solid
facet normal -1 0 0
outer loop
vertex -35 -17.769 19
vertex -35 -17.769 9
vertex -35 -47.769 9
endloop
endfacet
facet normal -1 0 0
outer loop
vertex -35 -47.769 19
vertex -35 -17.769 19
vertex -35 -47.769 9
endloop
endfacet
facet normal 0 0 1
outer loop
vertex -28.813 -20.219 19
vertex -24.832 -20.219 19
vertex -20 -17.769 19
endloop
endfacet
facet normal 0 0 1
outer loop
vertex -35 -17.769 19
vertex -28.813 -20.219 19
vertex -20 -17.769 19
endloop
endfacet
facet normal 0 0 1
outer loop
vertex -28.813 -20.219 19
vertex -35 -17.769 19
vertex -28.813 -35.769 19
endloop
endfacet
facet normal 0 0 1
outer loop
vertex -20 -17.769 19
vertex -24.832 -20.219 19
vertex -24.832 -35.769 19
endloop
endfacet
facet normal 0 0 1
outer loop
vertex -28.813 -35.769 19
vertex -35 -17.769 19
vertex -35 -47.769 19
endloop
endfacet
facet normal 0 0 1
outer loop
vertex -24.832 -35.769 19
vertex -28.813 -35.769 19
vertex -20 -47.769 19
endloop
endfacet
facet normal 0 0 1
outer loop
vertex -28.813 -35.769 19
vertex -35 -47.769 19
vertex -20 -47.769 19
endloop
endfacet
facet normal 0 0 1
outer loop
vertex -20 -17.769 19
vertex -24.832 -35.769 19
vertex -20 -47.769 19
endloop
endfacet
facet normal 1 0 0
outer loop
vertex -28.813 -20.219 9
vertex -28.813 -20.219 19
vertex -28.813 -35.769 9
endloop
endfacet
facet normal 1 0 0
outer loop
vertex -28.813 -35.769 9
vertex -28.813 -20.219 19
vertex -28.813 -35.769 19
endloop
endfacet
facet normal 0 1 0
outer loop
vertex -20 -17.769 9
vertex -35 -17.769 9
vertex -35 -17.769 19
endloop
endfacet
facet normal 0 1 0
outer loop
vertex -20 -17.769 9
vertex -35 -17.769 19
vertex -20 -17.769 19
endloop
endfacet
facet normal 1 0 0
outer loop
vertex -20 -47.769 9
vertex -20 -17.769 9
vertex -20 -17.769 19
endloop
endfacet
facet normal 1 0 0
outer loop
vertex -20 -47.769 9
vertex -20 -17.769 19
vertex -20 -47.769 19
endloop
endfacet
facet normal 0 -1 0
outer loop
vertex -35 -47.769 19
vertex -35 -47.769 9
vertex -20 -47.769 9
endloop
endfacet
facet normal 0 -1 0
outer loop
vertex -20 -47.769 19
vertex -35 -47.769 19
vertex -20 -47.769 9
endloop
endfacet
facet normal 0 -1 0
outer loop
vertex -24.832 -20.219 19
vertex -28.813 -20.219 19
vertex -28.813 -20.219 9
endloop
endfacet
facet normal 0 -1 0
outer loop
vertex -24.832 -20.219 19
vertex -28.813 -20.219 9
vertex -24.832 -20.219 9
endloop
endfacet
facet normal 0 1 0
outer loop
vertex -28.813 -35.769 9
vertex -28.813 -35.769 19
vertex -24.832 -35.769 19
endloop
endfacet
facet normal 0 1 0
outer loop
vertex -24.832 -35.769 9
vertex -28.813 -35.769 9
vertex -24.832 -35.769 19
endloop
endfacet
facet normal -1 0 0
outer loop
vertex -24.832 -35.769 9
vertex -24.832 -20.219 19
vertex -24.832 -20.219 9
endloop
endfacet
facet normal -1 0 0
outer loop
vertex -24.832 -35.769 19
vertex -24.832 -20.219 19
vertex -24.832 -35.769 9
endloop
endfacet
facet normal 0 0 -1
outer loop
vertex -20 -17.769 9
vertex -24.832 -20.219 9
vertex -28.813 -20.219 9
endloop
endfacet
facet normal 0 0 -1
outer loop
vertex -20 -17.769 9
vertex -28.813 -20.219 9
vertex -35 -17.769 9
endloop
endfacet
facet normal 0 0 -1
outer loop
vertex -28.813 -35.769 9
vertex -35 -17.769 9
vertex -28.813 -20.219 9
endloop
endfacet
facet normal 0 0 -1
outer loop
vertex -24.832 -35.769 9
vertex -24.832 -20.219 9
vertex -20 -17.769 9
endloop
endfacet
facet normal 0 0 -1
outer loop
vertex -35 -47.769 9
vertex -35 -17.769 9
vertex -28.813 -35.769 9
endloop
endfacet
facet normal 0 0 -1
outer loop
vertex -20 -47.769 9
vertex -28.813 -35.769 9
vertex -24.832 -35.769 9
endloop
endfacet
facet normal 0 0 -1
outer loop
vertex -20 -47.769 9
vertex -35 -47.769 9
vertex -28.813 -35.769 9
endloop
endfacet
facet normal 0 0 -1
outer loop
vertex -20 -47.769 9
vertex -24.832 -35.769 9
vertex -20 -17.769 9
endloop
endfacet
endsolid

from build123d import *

# Parameters (mm, degrees)
SKETCH020_W     = 15
SKETCH020_H     = 30
PAD012_DEPTH    = 10
SKETCH023_W     = 3.980878
SKETCH023_H     = 15.550635
POCKET006_DEPTH = 10.001


with BuildPart() as pocket006:
    # Sketch020 → Pad012 (new body)
    with BuildSketch(Plane.XY.offset(9)):
        with Locations((-27.5, 32.769276)):
            Rectangle(SKETCH020_W, SKETCH020_H)
    extrude(amount=PAD012_DEPTH)

    # Sketch023 → Pocket006 (cut, through all)
    with BuildSketch(Plane.XY.offset(19)):
        with Locations((-26.822156, 27.993958)):
            Rectangle(SKETCH023_W, SKETCH023_H)
    extrude(amount=-POCKET006_DEPTH, mode=Mode.SUBTRACT)


with BuildPart() as part_mirroring:
    # Part__Mirroring: instance of Pocket006
    add(pocket006.part.mirror(Plane(origin=(0, 0, 0), x_dir=(1, 0, 0), z_dir=(0, 1, 0))))


solid = part_mirroring.part
